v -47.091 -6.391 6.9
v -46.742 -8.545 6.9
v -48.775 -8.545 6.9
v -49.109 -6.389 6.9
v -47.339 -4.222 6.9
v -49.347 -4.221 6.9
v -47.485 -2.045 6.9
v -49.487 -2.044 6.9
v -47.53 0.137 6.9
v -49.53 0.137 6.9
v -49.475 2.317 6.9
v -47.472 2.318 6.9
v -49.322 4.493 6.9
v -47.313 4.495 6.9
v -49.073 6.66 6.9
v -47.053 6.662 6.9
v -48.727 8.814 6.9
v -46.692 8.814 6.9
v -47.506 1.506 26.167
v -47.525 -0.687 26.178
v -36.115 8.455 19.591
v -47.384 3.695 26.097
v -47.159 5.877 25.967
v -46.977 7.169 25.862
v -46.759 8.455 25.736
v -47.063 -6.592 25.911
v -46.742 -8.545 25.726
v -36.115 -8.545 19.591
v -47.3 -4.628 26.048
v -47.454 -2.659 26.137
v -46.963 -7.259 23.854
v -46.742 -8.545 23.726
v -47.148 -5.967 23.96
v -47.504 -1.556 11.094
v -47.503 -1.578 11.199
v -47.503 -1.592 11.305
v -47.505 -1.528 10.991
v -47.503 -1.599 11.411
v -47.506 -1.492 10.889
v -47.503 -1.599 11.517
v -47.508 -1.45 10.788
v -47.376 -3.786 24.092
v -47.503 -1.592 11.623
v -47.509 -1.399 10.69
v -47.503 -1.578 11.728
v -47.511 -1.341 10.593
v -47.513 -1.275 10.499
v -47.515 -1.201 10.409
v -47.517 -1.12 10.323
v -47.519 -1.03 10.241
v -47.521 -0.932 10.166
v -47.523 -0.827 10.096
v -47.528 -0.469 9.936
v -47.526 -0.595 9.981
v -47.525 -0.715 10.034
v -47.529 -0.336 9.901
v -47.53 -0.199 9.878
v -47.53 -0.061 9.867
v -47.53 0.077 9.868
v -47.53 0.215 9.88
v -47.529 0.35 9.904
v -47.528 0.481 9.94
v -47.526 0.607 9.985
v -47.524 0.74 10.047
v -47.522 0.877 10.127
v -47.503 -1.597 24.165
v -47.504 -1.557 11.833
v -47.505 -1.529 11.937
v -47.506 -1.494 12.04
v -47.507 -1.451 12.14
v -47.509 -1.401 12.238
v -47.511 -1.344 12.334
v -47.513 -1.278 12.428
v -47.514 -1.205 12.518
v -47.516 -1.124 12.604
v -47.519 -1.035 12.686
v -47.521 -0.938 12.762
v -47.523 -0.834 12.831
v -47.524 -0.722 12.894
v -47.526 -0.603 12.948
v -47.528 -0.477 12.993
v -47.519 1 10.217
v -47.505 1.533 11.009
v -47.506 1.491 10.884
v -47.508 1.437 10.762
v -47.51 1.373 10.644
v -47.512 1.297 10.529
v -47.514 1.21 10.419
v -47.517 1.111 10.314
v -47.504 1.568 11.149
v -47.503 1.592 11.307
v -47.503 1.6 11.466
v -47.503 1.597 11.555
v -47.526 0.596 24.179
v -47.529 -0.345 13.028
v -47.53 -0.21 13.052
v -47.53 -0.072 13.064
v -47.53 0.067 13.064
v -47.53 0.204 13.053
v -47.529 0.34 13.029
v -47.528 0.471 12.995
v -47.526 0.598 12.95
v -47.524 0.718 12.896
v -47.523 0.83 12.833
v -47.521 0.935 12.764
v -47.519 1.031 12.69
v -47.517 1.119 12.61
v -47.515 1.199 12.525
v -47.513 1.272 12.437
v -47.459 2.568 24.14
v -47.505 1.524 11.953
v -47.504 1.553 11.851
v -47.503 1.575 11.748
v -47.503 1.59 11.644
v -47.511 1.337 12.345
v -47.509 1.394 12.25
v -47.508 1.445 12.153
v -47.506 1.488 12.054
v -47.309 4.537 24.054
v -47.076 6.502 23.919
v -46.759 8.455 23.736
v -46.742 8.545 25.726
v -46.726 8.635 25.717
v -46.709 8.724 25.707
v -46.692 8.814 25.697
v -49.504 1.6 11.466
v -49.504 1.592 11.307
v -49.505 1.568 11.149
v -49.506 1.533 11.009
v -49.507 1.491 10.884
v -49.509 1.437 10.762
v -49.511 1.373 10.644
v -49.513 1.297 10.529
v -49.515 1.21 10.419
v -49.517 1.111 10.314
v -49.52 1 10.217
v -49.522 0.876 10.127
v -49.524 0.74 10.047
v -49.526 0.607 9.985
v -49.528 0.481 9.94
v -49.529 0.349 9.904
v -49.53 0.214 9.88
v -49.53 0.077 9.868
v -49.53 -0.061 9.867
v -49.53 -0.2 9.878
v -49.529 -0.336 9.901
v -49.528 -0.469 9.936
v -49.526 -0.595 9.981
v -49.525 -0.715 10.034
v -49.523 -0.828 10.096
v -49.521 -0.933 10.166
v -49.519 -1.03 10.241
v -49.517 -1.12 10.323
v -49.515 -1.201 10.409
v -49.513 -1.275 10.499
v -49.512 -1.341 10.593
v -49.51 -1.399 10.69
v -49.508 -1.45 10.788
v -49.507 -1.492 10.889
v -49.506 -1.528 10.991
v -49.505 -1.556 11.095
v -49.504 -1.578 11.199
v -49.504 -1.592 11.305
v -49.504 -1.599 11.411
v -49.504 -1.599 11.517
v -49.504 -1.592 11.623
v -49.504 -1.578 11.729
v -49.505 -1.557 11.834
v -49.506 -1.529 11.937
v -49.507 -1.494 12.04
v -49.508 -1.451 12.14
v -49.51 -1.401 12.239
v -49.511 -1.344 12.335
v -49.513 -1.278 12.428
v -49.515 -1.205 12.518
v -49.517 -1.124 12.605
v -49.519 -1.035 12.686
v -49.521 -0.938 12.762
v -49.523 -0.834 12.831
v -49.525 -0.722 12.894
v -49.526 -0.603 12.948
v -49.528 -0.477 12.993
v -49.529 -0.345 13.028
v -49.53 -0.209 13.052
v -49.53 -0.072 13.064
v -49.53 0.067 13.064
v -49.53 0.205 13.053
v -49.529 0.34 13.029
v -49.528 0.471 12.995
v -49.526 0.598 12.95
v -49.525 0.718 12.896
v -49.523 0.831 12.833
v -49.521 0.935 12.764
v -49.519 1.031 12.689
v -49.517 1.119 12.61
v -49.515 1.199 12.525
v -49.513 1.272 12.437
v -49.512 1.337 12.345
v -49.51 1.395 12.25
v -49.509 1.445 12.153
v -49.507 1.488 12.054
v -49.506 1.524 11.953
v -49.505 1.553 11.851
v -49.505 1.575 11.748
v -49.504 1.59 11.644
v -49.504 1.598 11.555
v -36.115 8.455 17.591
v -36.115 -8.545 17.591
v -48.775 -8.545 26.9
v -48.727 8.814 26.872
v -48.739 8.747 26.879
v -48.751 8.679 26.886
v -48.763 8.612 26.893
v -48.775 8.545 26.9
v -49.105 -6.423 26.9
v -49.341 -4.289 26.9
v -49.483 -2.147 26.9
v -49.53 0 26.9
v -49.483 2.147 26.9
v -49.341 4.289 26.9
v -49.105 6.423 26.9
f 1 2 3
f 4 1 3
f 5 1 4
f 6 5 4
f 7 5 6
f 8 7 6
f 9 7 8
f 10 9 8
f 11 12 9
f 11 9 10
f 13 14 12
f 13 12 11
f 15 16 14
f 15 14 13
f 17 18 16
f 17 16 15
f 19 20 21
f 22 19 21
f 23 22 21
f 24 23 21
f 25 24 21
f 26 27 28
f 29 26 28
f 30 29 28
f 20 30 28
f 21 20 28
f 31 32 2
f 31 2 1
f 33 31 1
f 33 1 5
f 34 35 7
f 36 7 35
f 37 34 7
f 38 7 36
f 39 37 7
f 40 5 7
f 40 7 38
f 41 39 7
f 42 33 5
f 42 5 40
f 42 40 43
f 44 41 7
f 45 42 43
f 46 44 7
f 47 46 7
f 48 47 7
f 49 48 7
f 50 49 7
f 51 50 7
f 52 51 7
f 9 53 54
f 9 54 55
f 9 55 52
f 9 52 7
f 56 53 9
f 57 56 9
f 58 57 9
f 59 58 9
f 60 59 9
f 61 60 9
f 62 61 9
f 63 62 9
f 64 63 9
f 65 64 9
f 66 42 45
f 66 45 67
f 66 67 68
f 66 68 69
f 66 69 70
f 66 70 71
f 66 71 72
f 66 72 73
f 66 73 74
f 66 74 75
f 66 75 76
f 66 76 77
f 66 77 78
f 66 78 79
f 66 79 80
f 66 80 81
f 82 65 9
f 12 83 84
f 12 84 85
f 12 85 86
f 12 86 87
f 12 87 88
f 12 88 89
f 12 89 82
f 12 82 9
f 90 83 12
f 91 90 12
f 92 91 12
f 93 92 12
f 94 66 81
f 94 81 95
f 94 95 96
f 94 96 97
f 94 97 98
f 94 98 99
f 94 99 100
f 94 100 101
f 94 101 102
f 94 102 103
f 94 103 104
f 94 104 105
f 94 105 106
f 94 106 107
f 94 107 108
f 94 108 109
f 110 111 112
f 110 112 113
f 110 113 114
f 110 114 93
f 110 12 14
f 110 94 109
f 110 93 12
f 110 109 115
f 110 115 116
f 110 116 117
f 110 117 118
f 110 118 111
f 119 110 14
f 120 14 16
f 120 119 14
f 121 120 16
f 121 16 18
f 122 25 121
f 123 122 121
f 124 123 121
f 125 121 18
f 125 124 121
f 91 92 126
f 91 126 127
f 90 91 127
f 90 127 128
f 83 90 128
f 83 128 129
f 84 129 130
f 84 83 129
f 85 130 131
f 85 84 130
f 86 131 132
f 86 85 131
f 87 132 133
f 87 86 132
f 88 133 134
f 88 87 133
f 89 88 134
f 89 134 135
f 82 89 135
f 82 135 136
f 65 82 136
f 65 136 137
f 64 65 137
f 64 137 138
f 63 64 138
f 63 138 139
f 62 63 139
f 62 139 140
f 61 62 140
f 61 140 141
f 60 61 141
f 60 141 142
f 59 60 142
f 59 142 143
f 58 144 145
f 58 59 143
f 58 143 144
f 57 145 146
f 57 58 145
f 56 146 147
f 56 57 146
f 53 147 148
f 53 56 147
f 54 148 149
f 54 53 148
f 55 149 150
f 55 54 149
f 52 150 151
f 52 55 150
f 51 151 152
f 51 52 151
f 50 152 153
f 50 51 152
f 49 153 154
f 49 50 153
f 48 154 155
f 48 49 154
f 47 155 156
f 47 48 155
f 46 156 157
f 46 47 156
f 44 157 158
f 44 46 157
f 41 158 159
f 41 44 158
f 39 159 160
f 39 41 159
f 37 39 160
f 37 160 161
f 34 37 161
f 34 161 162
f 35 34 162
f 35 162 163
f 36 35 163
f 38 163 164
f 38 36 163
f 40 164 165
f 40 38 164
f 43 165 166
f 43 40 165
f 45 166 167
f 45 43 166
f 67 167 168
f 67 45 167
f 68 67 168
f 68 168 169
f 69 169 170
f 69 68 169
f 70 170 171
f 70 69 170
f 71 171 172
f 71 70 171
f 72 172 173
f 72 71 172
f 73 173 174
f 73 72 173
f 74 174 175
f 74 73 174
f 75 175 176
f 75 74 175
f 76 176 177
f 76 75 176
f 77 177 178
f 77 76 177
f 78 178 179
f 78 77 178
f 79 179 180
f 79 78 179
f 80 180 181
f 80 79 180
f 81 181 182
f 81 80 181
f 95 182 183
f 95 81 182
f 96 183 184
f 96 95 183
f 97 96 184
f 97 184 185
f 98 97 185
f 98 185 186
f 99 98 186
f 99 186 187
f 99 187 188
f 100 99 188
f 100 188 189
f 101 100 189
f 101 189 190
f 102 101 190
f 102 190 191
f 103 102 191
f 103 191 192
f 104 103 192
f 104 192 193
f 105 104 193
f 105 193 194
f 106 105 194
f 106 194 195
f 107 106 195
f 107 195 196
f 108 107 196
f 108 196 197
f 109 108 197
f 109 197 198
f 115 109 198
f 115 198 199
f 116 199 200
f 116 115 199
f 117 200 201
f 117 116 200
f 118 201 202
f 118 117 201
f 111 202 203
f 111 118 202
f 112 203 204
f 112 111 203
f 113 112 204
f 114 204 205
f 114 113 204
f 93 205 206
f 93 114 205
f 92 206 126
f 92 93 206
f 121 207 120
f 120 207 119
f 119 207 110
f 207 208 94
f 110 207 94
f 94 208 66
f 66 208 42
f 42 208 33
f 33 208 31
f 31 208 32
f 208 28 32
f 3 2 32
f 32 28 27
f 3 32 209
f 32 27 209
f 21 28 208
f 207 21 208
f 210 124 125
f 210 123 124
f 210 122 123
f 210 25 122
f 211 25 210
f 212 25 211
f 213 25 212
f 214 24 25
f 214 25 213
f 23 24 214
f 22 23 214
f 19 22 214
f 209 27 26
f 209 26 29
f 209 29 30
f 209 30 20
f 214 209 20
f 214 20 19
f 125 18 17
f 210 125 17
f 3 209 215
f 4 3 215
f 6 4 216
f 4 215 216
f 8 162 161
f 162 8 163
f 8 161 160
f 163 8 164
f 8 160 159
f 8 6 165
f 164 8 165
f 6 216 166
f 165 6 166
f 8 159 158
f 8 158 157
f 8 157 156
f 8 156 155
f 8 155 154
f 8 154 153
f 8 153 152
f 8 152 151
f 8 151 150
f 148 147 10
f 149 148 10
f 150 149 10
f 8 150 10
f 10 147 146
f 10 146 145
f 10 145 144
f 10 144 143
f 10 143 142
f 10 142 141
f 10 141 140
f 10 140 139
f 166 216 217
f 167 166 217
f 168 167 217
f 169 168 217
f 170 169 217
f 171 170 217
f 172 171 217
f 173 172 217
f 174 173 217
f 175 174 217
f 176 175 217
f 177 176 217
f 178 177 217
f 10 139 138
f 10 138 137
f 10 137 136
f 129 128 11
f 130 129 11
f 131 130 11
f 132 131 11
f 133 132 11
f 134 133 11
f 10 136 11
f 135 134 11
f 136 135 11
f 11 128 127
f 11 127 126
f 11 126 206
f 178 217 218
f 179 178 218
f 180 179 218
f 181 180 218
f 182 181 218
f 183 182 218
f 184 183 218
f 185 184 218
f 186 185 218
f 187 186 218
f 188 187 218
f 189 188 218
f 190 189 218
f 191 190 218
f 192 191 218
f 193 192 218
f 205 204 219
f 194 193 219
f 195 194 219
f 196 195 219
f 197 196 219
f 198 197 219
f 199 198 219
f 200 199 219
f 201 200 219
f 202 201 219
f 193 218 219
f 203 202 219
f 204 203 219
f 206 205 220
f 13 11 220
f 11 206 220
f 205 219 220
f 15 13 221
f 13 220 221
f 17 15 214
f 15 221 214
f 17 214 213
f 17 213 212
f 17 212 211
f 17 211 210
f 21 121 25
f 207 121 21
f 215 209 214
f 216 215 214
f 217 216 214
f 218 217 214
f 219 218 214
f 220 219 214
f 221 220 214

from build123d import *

# Parameters (mm, degrees)
PAD011_DEPTH            = 20
PAD012_DEPTH            = 17
POCKET007_DEPTH         = 17.359799
SKETCH024_R             = 1.6
POCKET008_DEPTH         = 48.751
BODY008_PLACEMENT_ANGLE = 180


with BuildPart() as part:
    # Sketch021 → Pad011 (new body)
    with BuildSketch(Plane.XY):
        with BuildLine():
            ThreePointArc((47.995272, -8.544961), (48.749809, 0.136622), (47.946624, 8.813839))
            Line((45.911641, 8.813839), (47.946624, 8.813839))
            ThreePointArc((45.962443, -8.544961), (46.7498, 0.136818), (45.911641, 8.813839))
            Line((45.962443, -8.544961), (47.995272, -8.544961))
        make_face()
    extrude(amount=PAD011_DEPTH)

    # Sketch022 (on Face1 of Pad011) → Pad012 (join)
    with BuildSketch(Plane.XZ.offset(8.544961)):
        Polygon((47.995272, 0), (35.335121, 7.309342), (35.335121, 9.309342), (47.995272, 2), align=None)
    extrude(amount=-PAD012_DEPTH)

    # Sketch023 (on Face1 of Pad012) → Pocket007 (cut, through all)
    with BuildSketch(Plane.XZ.offset(8.544961)):
        Polygon((43.159527, 2.791919), (47.995272, 0), (43.159527, 0), align=None)
    extrude(amount=-POCKET007_DEPTH, mode=Mode.SUBTRACT)

    # Sketch024 → Pocket008 (cut, through all)
    with BuildSketch(Plane.YZ):
        with Locations((0, 15.434235)):
            Circle(SKETCH024_R)
    extrude(amount=POCKET008_DEPTH, mode=Mode.SUBTRACT)


with BuildPart() as part_1:
    # Body008 placement: moved
    add(part.part.moved(Location((-0.78, 0, 26.9))).rotate(Axis((-0.78, 0, 26.9), (0, 1, 0)), BODY008_PLACEMENT_ANGLE))


solid = part_1.part
